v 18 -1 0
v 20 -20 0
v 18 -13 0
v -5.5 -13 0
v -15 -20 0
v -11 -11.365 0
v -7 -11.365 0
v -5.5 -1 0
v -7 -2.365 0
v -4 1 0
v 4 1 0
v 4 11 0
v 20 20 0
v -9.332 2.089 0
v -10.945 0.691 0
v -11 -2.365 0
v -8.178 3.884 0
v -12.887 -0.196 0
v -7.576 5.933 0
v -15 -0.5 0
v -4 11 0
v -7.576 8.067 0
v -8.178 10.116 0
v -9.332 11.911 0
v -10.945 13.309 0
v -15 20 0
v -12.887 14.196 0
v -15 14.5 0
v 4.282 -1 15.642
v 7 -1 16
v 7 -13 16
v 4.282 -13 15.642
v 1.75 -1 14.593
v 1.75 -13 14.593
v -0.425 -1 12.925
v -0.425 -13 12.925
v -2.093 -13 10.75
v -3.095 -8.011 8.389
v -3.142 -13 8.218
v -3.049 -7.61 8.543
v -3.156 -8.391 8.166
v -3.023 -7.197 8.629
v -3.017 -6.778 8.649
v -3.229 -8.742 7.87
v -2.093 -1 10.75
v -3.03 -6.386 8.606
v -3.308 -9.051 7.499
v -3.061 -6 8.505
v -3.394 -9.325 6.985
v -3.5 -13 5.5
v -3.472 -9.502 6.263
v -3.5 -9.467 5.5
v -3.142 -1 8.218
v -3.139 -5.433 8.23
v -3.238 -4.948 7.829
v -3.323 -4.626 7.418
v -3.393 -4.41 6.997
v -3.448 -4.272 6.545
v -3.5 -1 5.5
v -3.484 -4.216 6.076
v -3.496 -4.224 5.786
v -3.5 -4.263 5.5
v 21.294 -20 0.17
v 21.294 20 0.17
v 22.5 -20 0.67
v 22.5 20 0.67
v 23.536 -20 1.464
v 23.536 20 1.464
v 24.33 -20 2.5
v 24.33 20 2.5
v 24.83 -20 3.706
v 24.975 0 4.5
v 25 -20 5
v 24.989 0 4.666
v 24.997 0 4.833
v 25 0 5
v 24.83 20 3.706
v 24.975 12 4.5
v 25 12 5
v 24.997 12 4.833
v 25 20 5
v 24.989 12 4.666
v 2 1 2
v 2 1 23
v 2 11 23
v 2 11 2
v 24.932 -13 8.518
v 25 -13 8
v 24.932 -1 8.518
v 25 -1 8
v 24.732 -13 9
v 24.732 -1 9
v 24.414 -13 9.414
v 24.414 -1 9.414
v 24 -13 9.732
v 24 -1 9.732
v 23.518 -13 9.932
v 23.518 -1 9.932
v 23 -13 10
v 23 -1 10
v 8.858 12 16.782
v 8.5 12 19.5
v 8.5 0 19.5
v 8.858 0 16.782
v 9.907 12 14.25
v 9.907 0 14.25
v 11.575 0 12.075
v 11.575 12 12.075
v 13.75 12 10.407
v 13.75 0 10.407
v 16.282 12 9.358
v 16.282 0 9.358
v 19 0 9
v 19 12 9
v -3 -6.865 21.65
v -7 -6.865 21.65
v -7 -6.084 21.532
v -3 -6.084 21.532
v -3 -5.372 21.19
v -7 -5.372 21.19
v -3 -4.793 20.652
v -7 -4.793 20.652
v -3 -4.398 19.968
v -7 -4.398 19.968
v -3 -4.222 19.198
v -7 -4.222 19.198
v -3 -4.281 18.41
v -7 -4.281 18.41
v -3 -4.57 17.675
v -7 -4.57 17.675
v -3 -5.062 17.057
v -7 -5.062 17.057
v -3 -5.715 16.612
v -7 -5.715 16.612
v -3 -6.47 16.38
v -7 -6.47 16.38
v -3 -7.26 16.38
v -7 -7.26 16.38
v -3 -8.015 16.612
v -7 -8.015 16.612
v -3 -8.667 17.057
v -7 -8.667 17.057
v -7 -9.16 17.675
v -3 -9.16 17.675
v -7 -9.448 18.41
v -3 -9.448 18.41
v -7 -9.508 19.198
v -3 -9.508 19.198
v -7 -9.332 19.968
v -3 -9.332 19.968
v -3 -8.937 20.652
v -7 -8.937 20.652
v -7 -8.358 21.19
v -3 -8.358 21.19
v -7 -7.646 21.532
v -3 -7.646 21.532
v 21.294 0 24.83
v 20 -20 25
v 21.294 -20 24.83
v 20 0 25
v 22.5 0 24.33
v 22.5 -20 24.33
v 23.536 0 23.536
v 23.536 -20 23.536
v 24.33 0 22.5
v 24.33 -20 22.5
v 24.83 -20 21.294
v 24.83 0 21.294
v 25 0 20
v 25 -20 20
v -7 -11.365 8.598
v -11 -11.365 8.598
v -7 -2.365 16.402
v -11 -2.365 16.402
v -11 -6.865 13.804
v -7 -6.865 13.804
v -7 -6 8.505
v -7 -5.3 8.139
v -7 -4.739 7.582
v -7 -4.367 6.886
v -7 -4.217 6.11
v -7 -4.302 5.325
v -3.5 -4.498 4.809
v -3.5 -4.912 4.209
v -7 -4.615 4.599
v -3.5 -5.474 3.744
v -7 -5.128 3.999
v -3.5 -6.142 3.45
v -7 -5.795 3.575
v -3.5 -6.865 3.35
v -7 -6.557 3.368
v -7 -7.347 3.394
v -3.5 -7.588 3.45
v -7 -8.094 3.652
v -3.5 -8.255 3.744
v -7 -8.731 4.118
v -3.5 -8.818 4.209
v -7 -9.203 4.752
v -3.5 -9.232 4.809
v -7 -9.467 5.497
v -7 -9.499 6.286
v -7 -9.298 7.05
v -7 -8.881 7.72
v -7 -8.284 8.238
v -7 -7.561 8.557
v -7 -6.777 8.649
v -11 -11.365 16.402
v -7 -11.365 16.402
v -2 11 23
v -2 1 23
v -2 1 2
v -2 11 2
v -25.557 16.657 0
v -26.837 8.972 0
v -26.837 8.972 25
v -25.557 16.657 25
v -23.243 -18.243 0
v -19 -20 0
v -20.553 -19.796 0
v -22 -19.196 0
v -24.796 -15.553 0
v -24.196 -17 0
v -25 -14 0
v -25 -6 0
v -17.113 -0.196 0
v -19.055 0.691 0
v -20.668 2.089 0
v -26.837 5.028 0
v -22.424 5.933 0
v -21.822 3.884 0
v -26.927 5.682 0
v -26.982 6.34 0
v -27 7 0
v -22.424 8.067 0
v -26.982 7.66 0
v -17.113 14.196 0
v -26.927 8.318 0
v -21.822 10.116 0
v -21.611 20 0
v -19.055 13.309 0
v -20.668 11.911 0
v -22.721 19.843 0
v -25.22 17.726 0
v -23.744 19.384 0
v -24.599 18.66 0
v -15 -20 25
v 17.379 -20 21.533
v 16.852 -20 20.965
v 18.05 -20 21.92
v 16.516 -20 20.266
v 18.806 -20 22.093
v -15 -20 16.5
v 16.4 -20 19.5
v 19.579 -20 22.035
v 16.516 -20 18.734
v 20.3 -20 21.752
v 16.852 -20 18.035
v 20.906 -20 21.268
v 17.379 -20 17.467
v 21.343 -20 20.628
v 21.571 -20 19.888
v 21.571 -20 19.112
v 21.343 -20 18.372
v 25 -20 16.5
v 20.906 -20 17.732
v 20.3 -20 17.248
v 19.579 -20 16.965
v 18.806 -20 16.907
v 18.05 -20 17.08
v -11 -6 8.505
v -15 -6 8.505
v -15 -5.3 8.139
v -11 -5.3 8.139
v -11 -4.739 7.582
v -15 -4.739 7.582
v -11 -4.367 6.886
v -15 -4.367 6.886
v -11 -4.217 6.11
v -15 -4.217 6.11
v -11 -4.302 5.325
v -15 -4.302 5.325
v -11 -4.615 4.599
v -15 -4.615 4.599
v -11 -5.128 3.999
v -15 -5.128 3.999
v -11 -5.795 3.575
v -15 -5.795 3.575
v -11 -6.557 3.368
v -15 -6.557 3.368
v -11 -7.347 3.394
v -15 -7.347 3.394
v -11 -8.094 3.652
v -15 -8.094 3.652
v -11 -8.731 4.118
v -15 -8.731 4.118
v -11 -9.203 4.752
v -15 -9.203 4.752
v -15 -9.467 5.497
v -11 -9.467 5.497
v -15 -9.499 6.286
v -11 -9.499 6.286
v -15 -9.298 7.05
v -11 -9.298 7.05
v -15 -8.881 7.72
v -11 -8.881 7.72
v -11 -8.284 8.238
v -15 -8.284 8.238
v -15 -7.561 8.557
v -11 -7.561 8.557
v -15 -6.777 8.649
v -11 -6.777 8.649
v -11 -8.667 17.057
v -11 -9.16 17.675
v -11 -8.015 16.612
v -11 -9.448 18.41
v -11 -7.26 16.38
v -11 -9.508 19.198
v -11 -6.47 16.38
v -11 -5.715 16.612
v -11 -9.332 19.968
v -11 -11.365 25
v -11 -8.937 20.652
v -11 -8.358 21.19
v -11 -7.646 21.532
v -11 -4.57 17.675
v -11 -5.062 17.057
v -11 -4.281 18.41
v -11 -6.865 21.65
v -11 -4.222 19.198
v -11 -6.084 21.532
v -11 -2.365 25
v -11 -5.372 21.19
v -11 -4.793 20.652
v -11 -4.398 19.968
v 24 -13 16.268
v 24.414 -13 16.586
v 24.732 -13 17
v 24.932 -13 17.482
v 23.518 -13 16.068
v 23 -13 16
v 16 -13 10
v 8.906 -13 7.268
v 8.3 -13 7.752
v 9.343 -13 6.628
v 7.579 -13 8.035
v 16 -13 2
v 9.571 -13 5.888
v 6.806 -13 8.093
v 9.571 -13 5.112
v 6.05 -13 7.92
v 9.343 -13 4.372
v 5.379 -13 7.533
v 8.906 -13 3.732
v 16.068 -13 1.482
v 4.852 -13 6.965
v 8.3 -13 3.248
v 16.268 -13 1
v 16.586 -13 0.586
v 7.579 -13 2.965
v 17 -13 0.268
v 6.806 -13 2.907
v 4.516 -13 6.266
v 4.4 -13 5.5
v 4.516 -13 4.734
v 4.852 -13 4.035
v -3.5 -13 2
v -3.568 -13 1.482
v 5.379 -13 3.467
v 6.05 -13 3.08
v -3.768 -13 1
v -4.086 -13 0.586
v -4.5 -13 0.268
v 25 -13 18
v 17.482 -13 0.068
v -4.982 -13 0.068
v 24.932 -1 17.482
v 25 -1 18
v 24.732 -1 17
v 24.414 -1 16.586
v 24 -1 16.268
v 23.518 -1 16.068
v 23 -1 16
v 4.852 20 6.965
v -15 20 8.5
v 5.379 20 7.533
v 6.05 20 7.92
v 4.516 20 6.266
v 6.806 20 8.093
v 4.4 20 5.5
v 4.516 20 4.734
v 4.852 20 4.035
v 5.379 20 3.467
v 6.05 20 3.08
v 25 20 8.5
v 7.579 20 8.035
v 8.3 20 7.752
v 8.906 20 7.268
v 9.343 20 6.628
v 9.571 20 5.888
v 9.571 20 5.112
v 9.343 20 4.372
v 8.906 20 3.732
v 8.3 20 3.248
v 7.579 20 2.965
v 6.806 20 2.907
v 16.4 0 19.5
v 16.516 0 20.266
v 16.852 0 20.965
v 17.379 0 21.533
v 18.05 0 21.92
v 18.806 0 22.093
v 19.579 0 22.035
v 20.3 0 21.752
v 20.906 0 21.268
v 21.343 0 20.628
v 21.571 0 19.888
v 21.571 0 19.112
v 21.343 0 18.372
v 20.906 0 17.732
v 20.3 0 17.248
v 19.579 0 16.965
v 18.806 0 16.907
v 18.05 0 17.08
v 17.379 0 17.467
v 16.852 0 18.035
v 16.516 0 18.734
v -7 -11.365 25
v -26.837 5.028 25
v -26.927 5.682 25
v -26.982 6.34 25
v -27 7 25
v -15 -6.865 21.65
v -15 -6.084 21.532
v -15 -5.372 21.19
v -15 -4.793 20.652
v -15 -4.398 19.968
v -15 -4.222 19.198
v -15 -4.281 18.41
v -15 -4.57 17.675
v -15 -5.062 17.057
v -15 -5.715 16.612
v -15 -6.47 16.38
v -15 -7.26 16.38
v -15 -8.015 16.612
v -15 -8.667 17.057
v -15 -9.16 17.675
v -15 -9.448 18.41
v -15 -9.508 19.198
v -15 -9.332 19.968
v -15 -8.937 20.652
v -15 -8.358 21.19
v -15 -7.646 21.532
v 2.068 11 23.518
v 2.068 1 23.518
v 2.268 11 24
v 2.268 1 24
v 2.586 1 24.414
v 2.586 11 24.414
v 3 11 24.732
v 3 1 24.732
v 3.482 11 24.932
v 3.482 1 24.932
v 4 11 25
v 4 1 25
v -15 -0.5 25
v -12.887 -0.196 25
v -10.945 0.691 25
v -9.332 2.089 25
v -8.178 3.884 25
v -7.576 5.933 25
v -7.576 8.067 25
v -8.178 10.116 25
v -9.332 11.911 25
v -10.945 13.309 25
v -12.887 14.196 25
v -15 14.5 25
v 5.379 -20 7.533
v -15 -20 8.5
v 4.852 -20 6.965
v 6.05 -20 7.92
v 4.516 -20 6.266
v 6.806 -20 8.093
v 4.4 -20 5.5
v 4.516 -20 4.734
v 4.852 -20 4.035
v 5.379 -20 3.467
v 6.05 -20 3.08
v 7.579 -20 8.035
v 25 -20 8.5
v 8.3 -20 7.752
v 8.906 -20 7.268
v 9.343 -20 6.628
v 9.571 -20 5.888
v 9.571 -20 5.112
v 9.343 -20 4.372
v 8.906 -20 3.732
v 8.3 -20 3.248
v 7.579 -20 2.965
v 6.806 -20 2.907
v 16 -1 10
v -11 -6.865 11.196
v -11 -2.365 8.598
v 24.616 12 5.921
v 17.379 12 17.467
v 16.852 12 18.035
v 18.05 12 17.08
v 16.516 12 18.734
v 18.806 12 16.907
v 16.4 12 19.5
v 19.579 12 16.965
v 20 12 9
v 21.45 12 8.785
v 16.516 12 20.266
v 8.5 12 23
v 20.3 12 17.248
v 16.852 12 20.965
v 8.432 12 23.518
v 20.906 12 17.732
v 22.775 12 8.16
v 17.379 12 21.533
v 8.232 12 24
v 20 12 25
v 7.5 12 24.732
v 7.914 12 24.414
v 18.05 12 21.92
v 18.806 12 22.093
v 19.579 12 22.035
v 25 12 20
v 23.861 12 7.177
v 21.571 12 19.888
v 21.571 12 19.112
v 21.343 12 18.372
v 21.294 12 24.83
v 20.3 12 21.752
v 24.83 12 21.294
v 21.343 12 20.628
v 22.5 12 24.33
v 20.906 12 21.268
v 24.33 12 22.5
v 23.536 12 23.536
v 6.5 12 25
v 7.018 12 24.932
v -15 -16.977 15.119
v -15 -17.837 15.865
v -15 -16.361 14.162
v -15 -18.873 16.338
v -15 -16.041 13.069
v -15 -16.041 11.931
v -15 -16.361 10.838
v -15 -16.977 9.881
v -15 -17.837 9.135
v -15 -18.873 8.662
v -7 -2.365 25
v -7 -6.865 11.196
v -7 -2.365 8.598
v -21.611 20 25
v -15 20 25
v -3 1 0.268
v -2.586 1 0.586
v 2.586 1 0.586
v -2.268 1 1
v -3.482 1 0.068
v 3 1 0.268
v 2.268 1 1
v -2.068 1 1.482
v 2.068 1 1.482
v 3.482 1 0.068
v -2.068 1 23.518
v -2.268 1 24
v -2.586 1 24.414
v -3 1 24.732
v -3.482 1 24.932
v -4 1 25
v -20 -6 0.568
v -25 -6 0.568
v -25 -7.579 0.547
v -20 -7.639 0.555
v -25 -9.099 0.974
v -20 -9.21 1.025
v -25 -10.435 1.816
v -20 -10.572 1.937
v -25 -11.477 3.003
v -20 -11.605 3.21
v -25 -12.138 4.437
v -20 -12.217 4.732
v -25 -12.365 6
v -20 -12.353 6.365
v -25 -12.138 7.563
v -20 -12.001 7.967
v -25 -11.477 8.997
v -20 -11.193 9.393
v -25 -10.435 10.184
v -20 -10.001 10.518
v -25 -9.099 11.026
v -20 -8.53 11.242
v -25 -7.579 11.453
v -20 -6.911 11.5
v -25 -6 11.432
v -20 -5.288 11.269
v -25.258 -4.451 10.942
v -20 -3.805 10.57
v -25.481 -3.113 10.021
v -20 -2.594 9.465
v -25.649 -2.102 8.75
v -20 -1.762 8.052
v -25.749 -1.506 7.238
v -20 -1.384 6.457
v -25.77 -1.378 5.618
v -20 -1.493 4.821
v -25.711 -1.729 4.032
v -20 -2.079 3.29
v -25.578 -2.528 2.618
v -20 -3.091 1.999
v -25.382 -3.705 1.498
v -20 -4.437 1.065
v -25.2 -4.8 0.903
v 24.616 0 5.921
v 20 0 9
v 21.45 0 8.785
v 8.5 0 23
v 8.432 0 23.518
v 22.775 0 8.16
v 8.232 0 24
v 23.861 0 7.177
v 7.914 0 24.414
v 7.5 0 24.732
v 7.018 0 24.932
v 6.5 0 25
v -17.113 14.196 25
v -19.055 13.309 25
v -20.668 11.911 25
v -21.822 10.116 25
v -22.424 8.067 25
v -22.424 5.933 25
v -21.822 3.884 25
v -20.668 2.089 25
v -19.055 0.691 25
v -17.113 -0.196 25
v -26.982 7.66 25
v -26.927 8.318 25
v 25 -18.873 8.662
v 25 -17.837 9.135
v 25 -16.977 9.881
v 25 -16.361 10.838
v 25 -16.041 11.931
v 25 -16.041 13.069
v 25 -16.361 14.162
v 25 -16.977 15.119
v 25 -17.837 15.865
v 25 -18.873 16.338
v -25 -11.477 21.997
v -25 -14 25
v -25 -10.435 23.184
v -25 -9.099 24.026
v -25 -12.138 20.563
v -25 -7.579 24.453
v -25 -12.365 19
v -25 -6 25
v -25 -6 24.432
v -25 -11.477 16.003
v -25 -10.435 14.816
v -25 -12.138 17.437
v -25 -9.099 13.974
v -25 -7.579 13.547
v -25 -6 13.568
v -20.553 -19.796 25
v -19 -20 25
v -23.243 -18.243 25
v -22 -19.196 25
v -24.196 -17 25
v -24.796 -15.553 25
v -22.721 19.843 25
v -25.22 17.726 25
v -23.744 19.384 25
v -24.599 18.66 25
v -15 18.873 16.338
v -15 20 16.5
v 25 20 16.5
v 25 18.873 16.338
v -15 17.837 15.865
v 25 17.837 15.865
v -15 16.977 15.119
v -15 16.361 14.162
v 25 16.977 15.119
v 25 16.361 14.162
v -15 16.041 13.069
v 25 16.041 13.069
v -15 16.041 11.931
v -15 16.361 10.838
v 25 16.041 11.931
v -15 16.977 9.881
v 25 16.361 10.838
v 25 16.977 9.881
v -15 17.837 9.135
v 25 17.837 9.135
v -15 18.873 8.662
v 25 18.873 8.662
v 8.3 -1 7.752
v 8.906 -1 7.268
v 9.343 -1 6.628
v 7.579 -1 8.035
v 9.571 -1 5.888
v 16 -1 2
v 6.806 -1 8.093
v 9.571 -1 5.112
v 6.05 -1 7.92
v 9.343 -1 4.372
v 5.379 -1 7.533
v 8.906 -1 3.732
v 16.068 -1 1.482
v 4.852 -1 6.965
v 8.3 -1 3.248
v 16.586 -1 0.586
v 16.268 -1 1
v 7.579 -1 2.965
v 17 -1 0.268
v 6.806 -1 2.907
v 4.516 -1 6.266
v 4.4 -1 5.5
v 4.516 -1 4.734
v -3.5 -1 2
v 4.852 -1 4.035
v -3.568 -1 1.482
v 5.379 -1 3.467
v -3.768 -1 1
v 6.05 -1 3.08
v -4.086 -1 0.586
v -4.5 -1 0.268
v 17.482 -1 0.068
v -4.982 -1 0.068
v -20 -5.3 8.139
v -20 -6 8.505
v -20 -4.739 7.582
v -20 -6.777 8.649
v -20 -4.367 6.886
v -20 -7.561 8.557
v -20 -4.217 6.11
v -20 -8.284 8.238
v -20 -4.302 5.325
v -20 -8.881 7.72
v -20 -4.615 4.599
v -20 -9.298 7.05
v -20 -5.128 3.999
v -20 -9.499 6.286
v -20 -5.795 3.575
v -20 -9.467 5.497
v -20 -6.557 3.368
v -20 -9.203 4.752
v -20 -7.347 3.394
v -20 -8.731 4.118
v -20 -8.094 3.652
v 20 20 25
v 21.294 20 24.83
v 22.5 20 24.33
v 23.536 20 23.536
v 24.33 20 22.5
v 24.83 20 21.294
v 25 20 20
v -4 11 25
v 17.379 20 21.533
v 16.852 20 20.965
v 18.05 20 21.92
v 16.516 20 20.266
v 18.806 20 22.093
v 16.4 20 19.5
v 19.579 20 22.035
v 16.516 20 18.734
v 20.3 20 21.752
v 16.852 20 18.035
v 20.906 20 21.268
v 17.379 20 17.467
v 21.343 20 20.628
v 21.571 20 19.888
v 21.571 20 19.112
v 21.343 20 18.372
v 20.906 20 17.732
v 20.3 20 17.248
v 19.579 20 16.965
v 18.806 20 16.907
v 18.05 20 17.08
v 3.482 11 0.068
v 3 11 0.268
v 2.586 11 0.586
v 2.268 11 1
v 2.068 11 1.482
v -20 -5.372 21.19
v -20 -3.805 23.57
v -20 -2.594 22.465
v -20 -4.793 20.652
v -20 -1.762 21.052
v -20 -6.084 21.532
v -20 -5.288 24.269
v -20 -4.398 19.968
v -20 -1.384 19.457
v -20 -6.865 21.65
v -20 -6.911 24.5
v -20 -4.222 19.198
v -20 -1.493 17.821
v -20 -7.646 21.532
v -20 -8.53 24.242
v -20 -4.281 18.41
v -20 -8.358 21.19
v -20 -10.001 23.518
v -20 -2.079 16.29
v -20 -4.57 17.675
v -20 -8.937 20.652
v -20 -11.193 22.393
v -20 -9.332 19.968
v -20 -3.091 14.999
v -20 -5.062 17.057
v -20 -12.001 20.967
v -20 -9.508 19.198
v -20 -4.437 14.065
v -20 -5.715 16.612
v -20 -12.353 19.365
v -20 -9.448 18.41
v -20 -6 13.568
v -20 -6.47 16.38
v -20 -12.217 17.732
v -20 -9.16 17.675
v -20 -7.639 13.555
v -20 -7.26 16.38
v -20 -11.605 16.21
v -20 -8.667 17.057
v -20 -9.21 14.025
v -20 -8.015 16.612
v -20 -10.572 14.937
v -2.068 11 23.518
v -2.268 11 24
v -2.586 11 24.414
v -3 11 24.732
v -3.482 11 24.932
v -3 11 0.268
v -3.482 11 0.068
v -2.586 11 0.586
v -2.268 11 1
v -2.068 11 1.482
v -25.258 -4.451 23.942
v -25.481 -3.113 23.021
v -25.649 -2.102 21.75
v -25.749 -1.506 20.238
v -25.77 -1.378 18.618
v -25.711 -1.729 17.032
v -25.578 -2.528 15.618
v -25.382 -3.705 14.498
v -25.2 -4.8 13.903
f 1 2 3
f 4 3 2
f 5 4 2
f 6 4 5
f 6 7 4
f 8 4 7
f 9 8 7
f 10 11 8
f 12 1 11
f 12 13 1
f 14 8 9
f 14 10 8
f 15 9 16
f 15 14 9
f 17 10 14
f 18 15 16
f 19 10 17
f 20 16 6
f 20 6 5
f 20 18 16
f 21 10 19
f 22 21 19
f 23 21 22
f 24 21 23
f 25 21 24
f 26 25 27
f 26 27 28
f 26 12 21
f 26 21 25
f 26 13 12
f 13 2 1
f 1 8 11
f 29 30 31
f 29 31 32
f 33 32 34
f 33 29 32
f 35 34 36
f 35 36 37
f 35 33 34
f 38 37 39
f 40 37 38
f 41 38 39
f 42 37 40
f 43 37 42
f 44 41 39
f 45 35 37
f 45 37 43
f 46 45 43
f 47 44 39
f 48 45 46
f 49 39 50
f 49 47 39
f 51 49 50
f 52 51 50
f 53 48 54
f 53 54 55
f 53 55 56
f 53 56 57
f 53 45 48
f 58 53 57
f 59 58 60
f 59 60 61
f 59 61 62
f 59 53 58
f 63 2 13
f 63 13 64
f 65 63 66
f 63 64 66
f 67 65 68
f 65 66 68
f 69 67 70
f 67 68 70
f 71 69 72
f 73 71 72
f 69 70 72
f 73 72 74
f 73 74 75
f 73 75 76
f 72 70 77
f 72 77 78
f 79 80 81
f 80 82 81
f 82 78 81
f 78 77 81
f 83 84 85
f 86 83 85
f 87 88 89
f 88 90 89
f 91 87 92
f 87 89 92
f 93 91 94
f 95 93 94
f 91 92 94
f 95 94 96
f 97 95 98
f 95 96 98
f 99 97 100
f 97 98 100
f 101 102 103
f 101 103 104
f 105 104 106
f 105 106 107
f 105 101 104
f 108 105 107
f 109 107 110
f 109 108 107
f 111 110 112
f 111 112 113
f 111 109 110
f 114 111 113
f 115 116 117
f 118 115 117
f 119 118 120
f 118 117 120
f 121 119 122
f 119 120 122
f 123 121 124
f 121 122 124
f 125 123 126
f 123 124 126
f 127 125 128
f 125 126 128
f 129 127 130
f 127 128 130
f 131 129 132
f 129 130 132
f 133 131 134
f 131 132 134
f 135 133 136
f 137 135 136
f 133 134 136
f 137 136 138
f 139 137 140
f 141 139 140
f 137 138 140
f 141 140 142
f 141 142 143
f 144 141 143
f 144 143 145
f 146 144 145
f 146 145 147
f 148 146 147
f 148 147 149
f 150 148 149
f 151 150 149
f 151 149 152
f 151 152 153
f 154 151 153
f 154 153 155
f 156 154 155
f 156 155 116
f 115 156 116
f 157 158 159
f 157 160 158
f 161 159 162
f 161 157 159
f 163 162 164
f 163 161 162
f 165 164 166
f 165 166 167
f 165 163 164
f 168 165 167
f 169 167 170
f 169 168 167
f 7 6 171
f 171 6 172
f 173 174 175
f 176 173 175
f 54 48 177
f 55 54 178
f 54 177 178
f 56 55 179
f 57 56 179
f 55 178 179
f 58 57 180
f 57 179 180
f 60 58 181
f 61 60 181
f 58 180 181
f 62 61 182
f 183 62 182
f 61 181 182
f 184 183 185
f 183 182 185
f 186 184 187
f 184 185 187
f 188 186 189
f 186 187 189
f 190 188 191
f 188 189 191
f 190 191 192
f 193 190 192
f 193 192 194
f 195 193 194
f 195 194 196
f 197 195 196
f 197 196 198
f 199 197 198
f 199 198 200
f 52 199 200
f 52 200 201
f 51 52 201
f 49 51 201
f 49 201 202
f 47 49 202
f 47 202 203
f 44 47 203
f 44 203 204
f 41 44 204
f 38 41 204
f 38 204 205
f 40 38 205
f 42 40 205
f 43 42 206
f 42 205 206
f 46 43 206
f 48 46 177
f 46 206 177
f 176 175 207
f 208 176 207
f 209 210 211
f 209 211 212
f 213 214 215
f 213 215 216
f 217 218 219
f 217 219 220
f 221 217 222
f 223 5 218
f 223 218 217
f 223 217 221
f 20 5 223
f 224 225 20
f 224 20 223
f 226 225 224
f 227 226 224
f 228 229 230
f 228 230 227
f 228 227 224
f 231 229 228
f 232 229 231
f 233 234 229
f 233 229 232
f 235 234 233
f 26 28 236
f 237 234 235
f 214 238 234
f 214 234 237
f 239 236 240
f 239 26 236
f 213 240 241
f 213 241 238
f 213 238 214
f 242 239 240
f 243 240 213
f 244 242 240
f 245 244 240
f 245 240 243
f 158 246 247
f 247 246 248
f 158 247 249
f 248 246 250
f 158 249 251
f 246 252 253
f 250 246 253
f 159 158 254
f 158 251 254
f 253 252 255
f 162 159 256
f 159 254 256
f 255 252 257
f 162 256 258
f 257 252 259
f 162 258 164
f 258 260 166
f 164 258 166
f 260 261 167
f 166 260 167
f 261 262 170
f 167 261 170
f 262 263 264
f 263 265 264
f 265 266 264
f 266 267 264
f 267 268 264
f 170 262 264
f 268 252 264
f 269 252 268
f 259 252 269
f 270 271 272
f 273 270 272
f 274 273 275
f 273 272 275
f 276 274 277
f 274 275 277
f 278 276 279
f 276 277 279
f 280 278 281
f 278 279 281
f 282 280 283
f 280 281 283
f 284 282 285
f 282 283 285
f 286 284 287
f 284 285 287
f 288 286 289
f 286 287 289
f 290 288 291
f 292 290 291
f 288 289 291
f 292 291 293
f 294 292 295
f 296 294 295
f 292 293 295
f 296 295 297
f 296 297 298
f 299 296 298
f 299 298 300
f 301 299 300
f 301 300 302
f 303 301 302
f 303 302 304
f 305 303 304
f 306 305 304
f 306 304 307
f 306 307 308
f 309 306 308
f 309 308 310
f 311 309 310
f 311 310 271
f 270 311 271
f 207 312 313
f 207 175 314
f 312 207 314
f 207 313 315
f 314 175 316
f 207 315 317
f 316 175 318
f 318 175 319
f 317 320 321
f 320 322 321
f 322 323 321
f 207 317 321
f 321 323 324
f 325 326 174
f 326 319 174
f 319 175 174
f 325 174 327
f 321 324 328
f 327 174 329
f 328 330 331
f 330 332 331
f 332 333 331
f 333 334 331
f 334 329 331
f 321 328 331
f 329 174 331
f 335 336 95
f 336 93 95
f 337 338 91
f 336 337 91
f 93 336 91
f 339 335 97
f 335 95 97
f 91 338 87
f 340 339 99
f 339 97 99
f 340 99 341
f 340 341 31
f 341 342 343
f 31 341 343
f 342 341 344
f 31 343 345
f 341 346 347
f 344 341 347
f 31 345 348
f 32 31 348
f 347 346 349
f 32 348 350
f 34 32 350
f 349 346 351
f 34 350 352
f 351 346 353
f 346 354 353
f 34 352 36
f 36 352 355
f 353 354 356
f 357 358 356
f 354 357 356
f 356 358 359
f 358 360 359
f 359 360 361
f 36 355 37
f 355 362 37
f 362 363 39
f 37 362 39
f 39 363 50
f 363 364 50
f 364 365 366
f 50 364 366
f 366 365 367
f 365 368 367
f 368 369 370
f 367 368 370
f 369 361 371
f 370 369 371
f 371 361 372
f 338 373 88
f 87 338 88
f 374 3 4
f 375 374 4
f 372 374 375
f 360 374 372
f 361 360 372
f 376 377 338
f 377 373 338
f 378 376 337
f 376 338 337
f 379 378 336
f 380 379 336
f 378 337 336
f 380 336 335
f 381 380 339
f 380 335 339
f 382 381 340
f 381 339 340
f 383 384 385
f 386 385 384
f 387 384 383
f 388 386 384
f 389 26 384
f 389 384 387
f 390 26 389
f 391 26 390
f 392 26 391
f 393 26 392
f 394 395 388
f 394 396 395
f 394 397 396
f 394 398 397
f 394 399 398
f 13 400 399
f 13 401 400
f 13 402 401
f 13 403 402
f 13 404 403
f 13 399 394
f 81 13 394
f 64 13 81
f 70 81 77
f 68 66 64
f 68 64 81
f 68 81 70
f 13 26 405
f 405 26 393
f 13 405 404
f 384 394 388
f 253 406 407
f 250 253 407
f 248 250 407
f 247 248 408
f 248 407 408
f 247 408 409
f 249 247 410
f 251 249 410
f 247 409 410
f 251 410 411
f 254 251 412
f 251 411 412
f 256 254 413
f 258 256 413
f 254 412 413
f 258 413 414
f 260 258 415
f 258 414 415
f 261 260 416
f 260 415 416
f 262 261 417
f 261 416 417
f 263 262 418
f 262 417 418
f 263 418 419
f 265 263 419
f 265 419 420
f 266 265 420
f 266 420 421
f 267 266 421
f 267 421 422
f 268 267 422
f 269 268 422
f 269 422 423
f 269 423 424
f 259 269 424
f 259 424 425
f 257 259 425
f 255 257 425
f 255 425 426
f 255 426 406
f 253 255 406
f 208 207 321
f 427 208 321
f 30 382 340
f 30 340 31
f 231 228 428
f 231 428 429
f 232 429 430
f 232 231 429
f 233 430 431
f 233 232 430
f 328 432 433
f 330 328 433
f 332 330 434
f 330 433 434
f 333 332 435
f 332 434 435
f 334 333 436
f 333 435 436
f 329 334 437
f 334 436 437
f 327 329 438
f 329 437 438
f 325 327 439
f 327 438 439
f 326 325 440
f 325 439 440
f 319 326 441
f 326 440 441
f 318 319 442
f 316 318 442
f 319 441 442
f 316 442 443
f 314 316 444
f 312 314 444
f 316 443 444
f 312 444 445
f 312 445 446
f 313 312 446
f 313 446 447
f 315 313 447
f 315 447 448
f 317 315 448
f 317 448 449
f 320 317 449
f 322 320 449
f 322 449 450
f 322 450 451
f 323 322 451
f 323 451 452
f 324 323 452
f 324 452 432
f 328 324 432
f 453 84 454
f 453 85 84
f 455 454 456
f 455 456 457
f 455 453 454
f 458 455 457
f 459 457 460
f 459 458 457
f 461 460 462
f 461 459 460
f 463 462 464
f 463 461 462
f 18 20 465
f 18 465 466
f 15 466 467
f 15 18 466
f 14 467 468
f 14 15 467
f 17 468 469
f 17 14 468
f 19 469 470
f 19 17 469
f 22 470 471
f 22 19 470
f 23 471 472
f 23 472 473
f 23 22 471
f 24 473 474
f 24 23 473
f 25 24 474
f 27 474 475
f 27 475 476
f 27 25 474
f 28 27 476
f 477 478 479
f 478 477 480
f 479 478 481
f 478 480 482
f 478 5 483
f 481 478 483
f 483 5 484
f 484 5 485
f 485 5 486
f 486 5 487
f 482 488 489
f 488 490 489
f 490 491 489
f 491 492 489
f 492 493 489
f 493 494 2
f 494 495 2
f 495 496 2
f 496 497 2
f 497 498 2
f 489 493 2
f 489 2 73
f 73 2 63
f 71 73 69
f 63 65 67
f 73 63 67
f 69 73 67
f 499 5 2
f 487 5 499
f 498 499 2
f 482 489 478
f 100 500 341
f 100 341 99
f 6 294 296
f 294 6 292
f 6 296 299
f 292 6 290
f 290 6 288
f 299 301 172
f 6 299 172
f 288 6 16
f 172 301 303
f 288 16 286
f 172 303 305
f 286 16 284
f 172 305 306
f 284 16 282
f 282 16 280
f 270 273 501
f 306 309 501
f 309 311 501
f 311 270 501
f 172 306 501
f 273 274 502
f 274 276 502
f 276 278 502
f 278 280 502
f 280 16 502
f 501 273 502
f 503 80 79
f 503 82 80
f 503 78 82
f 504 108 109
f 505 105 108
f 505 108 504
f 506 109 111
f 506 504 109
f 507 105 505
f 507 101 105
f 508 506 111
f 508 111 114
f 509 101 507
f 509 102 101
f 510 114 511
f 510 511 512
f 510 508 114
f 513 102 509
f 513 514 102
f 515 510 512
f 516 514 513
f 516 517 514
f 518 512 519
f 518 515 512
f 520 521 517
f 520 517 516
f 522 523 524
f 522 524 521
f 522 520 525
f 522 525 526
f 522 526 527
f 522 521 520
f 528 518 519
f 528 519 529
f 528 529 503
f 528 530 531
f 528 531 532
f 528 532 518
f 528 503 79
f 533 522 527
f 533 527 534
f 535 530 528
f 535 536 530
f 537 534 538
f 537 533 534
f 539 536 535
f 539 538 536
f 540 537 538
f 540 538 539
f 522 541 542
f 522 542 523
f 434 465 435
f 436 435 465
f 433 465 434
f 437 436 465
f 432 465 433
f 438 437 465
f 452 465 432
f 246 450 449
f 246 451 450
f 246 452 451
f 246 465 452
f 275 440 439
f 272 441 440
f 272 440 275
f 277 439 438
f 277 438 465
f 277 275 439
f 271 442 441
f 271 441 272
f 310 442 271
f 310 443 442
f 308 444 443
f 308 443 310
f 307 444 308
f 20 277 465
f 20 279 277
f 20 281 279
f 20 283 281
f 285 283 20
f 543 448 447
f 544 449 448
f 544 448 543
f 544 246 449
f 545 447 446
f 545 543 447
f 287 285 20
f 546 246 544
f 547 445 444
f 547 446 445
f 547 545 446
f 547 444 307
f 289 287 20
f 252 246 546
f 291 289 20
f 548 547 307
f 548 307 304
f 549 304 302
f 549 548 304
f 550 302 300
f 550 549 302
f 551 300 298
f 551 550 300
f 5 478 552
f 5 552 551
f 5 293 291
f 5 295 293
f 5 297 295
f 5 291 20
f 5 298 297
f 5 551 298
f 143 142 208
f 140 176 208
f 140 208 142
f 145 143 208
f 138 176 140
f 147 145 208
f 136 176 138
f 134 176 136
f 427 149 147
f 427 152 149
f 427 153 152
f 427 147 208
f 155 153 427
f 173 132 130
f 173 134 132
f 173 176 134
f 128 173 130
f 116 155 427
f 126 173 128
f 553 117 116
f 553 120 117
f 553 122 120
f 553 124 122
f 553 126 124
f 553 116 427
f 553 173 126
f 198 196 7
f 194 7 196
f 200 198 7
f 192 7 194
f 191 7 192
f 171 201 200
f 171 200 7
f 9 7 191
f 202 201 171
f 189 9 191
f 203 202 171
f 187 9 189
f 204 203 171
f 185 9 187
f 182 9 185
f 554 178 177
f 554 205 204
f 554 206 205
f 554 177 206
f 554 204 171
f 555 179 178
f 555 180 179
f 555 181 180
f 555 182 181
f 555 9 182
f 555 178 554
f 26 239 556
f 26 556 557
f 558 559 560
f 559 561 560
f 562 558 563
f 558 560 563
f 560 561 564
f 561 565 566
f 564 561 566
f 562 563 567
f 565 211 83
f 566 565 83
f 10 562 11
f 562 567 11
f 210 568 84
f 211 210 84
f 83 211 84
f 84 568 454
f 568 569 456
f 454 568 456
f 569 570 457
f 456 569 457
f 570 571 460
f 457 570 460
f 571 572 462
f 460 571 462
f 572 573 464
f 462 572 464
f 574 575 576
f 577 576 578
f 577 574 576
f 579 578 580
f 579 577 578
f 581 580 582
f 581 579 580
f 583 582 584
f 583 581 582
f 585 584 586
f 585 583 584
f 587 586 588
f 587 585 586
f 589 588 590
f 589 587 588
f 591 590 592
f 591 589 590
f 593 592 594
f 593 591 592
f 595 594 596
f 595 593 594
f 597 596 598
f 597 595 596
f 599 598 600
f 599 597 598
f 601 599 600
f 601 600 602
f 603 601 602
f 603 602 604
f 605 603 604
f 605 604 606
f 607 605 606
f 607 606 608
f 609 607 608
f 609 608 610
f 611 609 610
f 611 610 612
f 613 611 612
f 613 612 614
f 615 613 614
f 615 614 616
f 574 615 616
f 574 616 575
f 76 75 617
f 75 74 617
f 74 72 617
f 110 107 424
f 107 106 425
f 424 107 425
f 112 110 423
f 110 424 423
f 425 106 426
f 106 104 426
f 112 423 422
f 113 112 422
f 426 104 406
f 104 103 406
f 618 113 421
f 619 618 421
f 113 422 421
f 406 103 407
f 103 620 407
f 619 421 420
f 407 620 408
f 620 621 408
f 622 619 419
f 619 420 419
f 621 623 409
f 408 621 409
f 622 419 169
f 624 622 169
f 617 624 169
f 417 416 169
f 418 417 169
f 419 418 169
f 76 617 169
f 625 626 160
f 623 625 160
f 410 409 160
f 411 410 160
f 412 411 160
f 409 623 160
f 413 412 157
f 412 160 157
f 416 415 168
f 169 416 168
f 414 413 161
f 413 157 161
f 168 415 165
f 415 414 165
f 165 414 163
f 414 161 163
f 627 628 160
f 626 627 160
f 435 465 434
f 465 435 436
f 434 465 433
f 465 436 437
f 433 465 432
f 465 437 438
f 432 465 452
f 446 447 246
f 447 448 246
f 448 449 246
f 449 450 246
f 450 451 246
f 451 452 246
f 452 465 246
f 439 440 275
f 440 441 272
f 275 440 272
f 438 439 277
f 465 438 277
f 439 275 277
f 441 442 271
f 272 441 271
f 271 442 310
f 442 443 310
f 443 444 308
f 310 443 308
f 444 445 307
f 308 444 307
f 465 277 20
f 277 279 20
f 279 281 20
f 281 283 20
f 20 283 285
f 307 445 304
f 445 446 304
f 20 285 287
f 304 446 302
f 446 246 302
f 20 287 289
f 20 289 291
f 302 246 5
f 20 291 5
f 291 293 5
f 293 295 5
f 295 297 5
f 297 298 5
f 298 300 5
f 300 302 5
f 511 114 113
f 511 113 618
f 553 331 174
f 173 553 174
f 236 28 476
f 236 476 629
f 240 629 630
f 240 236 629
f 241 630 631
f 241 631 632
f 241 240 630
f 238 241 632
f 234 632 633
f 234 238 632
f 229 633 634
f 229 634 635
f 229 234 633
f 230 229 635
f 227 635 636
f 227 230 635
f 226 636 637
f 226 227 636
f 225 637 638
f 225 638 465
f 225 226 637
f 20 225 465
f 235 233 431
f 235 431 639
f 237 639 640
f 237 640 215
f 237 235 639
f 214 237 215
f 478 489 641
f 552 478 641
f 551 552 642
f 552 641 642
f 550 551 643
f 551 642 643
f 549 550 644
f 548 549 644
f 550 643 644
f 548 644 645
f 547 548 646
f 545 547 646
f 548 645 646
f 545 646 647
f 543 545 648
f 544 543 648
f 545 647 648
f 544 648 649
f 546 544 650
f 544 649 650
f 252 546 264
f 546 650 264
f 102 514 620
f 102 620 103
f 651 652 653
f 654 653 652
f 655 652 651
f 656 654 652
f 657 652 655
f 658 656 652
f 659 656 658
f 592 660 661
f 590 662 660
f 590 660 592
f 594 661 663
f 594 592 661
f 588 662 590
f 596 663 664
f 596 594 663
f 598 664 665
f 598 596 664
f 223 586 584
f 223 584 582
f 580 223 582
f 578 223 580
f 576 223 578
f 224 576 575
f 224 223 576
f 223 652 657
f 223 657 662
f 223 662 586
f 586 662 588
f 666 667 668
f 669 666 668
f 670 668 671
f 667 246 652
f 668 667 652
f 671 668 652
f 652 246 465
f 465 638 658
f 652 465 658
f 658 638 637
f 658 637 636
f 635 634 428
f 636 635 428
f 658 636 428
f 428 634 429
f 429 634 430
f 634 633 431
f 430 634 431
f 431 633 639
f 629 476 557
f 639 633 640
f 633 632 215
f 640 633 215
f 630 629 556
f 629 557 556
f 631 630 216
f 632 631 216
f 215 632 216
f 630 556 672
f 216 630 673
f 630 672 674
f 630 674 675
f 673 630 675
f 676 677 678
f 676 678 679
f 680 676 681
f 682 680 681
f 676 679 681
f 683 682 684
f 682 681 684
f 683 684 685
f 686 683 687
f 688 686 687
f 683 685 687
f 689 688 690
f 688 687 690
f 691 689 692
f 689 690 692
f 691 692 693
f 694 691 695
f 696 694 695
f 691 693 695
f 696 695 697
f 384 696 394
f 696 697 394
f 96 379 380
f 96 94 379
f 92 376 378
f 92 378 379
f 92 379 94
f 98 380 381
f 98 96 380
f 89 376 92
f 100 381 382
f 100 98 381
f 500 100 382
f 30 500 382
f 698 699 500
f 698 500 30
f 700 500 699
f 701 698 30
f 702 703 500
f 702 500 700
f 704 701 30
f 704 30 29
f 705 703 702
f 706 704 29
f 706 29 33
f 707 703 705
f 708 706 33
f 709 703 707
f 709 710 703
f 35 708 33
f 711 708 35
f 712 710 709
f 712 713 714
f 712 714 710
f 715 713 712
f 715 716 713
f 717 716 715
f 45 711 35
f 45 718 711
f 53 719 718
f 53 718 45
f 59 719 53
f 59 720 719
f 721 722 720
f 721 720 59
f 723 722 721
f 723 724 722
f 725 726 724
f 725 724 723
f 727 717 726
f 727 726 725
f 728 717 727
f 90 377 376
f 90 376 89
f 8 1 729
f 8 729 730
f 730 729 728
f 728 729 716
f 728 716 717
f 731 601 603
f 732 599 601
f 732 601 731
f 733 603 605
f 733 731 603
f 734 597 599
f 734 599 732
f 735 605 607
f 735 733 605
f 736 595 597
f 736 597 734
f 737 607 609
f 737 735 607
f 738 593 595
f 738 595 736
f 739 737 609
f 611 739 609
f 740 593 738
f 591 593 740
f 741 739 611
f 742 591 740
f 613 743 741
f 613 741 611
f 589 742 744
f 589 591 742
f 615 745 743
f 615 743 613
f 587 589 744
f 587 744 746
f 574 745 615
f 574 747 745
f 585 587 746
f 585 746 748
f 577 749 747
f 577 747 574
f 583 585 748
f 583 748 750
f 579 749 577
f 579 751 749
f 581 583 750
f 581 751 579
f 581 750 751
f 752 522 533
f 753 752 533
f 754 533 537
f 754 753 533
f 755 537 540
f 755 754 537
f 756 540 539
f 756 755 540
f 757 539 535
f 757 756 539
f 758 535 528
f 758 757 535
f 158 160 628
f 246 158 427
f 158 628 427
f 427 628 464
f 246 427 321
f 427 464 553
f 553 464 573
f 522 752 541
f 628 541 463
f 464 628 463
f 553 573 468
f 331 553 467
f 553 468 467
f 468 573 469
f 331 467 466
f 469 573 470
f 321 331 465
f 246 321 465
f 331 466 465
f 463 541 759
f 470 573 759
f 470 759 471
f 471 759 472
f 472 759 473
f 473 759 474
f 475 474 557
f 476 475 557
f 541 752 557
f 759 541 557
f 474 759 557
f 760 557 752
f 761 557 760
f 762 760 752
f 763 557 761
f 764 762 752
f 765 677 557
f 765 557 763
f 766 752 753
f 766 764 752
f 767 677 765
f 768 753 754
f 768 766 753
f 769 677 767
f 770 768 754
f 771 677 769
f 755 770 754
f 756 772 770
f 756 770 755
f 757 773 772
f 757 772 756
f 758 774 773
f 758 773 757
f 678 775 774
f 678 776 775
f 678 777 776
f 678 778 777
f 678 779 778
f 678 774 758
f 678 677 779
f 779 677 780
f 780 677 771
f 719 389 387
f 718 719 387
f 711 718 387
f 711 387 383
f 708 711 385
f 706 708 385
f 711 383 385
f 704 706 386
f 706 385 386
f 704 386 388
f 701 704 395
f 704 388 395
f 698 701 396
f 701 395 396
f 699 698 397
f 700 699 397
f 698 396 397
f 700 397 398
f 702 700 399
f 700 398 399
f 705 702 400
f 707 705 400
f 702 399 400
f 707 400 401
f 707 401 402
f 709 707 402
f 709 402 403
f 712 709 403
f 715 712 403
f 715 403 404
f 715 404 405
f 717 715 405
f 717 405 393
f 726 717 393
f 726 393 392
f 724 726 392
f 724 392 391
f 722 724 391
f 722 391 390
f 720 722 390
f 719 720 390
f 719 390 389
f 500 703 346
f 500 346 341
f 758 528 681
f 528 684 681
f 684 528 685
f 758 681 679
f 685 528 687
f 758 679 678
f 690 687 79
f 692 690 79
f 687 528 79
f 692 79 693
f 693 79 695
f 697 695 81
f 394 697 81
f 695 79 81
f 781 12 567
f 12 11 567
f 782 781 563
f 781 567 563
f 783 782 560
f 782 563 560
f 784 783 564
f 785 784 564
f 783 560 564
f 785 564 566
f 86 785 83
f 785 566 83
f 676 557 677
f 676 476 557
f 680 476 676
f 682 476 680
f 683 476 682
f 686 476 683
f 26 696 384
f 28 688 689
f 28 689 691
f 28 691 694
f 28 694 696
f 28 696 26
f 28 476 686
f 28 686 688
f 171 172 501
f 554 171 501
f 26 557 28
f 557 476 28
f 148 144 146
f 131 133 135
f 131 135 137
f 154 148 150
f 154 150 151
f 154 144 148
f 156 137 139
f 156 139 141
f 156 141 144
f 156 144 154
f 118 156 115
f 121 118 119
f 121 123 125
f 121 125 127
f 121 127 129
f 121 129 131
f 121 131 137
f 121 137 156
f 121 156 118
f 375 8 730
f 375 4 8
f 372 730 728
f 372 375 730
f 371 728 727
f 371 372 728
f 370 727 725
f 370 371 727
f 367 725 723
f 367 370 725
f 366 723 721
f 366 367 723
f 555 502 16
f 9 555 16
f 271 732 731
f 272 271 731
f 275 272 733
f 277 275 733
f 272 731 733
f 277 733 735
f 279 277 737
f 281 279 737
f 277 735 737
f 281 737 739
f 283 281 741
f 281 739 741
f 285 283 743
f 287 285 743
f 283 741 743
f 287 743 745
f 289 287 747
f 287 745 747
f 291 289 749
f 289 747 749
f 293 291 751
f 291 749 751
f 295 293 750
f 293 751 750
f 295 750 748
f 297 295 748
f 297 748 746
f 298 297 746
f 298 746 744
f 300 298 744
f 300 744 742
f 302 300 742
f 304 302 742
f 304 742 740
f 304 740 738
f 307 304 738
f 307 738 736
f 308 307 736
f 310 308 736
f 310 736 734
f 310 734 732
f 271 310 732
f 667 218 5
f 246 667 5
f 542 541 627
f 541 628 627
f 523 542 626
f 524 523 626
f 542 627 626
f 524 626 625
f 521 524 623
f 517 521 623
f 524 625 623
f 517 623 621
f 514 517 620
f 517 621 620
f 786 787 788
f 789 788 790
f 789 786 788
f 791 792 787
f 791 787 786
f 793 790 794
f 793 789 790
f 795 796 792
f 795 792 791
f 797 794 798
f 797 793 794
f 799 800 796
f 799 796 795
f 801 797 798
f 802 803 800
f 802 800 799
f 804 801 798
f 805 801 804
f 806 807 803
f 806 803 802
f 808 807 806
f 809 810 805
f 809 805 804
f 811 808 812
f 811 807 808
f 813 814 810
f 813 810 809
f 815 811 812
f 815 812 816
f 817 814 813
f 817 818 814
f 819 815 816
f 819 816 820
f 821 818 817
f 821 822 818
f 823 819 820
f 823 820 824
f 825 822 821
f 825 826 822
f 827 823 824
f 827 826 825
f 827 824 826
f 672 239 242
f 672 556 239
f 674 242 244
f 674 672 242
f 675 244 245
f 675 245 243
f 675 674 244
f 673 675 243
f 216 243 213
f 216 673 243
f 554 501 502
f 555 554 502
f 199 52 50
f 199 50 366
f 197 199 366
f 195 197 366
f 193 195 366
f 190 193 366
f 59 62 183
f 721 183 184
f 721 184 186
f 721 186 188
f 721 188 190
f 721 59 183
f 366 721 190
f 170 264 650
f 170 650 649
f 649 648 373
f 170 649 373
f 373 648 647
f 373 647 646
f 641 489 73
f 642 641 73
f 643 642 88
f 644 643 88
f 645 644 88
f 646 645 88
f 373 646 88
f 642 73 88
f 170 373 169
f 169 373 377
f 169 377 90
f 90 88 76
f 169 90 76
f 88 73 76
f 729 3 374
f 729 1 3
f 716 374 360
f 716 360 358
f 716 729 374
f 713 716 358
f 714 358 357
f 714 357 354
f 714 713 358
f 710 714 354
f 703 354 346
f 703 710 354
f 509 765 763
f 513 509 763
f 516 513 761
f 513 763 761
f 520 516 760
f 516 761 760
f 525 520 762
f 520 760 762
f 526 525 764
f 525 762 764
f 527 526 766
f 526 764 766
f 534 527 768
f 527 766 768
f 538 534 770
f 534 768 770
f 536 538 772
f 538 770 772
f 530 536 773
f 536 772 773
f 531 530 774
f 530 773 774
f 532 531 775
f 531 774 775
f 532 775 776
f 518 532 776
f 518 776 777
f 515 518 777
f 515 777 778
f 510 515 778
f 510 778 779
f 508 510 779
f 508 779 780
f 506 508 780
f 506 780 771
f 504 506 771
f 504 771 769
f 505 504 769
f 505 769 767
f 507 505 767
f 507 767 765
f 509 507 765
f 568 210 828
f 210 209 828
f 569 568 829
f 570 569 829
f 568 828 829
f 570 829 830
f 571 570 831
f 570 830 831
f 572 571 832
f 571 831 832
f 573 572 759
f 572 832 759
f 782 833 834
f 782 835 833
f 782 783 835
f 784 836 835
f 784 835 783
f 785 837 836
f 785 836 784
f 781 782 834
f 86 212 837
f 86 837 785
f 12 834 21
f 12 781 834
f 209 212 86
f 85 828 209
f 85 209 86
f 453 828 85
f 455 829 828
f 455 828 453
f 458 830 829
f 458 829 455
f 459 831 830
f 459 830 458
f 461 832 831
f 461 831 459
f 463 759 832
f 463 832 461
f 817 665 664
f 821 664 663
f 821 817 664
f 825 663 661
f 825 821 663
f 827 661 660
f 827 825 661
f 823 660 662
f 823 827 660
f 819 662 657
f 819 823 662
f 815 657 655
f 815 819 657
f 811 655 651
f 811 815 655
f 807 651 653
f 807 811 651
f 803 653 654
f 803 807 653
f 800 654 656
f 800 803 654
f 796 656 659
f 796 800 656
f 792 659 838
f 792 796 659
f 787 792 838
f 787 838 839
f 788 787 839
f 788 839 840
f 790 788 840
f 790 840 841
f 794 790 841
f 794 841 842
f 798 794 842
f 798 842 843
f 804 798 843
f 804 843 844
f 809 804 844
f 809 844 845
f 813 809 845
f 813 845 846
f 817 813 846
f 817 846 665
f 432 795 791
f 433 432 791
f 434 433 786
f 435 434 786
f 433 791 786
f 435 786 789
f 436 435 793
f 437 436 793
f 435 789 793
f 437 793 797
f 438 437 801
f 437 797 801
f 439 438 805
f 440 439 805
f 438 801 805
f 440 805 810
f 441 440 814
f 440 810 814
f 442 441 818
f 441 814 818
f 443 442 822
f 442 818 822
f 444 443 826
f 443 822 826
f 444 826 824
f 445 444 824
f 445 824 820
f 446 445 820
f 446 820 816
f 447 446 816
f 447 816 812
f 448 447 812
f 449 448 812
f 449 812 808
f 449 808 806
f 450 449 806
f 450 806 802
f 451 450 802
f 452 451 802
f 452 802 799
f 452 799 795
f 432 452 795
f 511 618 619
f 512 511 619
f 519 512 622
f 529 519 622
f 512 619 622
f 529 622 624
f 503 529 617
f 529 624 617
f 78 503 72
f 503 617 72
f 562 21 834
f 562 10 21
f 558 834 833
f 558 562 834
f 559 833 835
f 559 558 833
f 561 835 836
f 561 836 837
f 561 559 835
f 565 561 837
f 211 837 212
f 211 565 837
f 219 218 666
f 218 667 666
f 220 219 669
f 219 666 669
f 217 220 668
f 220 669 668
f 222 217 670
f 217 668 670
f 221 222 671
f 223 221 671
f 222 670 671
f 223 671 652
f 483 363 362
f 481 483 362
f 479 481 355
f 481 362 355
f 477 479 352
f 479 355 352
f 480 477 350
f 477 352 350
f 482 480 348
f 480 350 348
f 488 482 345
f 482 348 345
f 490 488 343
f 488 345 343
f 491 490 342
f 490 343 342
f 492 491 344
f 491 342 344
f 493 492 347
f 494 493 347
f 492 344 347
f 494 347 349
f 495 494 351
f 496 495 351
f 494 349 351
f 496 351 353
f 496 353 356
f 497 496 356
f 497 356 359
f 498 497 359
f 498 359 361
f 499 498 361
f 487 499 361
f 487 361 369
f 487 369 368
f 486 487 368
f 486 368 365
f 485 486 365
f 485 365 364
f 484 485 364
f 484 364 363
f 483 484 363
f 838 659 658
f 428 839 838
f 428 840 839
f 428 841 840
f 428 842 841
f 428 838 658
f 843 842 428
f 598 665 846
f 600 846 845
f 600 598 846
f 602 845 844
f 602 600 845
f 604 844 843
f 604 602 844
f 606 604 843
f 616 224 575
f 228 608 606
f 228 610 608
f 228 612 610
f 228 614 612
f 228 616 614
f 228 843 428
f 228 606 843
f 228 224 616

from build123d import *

# Parameters (mm, degrees)
SKETCH1_W               = 50
SKETCH1_H               = 40
SKETCH1_R               = 7.5
BOSS_EXTRUDE1_DEPTH     = 25
SKETCH2_R               = 4
CUT_EXTRUDE1_DEPTH      = 40
SKETCH4_R               = 2.6
CUT_EXTRUDE2_DEPTH      = 54.38539126
BOSS_EXTRUDE2_DEPTH     = 25
SKETCH6_W               = 4
SKETCH6_H               = 10
CUT_EXTRUDE3_DEPTH      = 42.880783183
CUT_EXTRUDE4_START      = -8
CUT_EXTRUDE4_DEPTH      = 12
CUT_EXTRUDE5_START      = -21
CUT_EXTRUDE5_DEPTH      = 12
SKETCH12_R              = 2.65
CUT_EXTRUDE6_DEPTH      = 22
CUT_EXTRUDE7_START      = -14
CUT_EXTRUDE7_DEPTH      = 4
CUT_EXTRUDE8_DEPTH      = 10
CUT_EXTRUDE8_DEPTH_BACK = 5
SKETCH14_R              = 5.5
FILLET1_R               = 5
FILLET2_R               = 2
FILLET3_R               = 4
FILLET4_R               = 5
FILLET5_R               = 6


with BuildPart() as part:
    # Sketch1 → Boss-Extrude1 (new body)
    with BuildSketch(Plane.XY):
        Rectangle(SKETCH1_W, SKETCH1_H)
        with Locations((-15, 7)):
            Circle(SKETCH1_R, mode=Mode.SUBTRACT)
    extrude(amount=BOSS_EXTRUDE1_DEPTH)

    # Sketch2 → Cut-Extrude1 (cut)
    with BuildSketch(Plane(origin=(25, 0, 0), x_dir=(0, 0, -1), z_dir=(1, 0, 0))):
        with Locations((-12.5, 20)):
            Circle(SKETCH2_R)
        with Locations((-12.5, -20)):
            Circle(SKETCH2_R)
    extrude(amount=-CUT_EXTRUDE1_DEPTH, mode=Mode.SUBTRACT)

    # Sketch4 → Cut-Extrude2 (cut, through all)
    with BuildSketch(Plane(origin=(0, 20, 0), x_dir=(1, 0, 0), z_dir=(0, 1, 0))):
        with Locations(Location((7, -5.5, 0), (0, 0, 180))):
            Circle(SKETCH4_R)
        with Locations(Location((19, -19.5, 0), (0, 0, 180))):
            Circle(SKETCH4_R)
    extrude(amount=-CUT_EXTRUDE2_DEPTH, mode=Mode.SUBTRACT)

    # Sketch17 → Boss-Extrude2 (add)
    with BuildSketch(Plane(origin=(0, 0, 0), x_dir=(-1, 0, 0), z_dir=(0, 0, -1))):
        with BuildLine():
            ThreePointArc((26.836925734, 5.028404411), (26.164478755, 2.600634803), (25, 0.366750419))
            Line((25, 0.366750419), (25, -6))
            Line((25, -6), (26.836925734, 5.028404411))
        make_face()
        with BuildLine():
            ThreePointArc((27, 7), (26.959161944, 7.989164089), (26.836925734, 8.971595589))
            ThreePointArc((26.836925734, 8.971595589), (26.164478755, 11.399365197), (25, 13.633249581))
            Line((25, 13.633249581), (25, 0.366750419))
            ThreePointArc((25, 0.366750419), (26.164478755, 2.600634803), (26.836925734, 5.028404411))
            ThreePointArc((26.836925734, 5.028404411), (26.959161944, 6.010835911), (27, 7))
        make_face()
        with BuildLine():
            Line((26.836925734, 8.971595589), (25, 20))
            Line((25, 20), (25, 13.633249581))
            ThreePointArc((25, 13.633249581), (26.164478755, 11.399365197), (26.836925734, 8.971595589))
        make_face()
    extrude(amount=-BOSS_EXTRUDE2_DEPTH)

    # Sketch6 → Cut-Extrude3 (cut, through all)
    with BuildSketch(Plane.XY.offset(25)):
        with Locations((0, 6)):
            Rectangle(SKETCH6_W, SKETCH6_H)
    extrude(amount=-CUT_EXTRUDE3_DEPTH, mode=Mode.SUBTRACT)

    # Sketch8 → Cut-Extrude4 (cut)
    with BuildSketch(Plane(origin=(0, 20, 0), x_dir=(1, 0, 0), z_dir=(0, 1, 0)).offset(CUT_EXTRUDE4_START)):
        with BuildLine():
            Line((19, -9), (29.5, -9))
            Line((29.5, -9), (29.5, -30))
            Line((29.5, -30), (19, -30))
            Line((19, -30), (8.5, -30))
            Line((8.5, -30), (8.5, -19.5))
            ThreePointArc((8.5, -19.5), (11.575378798, -12.075378798), (19, -9))
        make_face()
    extrude(amount=-CUT_EXTRUDE4_DEPTH, mode=Mode.SUBTRACT)

    # Sketch11 → Cut-Extrude5 (cut)
    with BuildSketch(Plane(origin=(0, 20, 0), x_dir=(1, 0, 0), z_dir=(0, 1, 0)).offset(CUT_EXTRUDE5_START)):
        with BuildLine():
            Line((16, -5), (16, -10))
            Line((16, -10), (26.226618187, -10))
            Line((26.226618187, -10), (26.226618187, -16))
            Line((26.226618187, -16), (7, -16))
            ThreePointArc((7, -16), (-0.424621202, -12.924621202), (-3.5, -5.5))
            Line((-3.5, -5.5), (-3.5, 3.5))
            Line((-3.5, 3.5), (16, 3.5))
            Line((16, 3.5), (16, -5))
        make_face()
    extrude(amount=-CUT_EXTRUDE5_DEPTH, mode=Mode.SUBTRACT)

    # Sketch12 → Cut-Extrude6 (cut)
    with BuildSketch(Plane.ZY.offset(25)):
        with Locations((19, -6.86493963)):
            Circle(SKETCH12_R)
        with Locations(Location((6, -6.86493963, 0), (0, 0, 19.049949226))):
            Circle(SKETCH12_R)
    extrude(amount=-CUT_EXTRUDE6_DEPTH, mode=Mode.SUBTRACT)

    # Sketch13 → Cut-Extrude7 (cut)
    with BuildSketch(Plane.ZY.offset(25).offset(CUT_EXTRUDE7_START)):
        Polygon((4.529172568, -11.36493963), (8.598076211, -11.36493963), (11.196152423, -6.86493963), (8.598076211, -2.36493963), (3.819451615, -2.36493963), (-1.875046018, -2.36493963), (-1.875046018, -11.36493963), align=None)
        Polygon((21.598076211, -2.36493963), (16.401923789, -2.36493963), (13.803847577, -6.86493963), (16.401923789, -11.36493963), (21.845916949, -11.36493963), (28.602568589, -11.36493963), (28.602568589, -2.36493963), align=None)
    extrude(amount=-CUT_EXTRUDE7_DEPTH, mode=Mode.SUBTRACT)

    # Sketch14 → Cut-Extrude8 (cut, two sides: drawn at the far end of the back side and taken through both)
    with BuildSketch(Plane.ZY.offset(25).offset(-CUT_EXTRUDE8_DEPTH_BACK)):
        with Locations(Location((6, -6.86493963, 0), (0, 0, 170.952005971))):
            Circle(SKETCH14_R)
        with Locations(Location((19, -6.86493963, 0), (0, 0, 170.952005971))):
            Circle(SKETCH14_R)
    extrude(amount=CUT_EXTRUDE8_DEPTH + CUT_EXTRUDE8_DEPTH_BACK, mode=Mode.SUBTRACT)


with BuildPart() as body_2:
    # Split1: the piece on the far side of the plane
    add(part.part)
    split(bisect_by=Plane(origin=(-15, 0, 0), x_dir=(0, 0, -1), z_dir=(-1, 0, 0)), keep=Keep.BOTTOM)

    # Fillet1
    fillet1_edges = [body_2.edges().sort_by_distance(p)[0] for p in [
        (25, 0, 0),
        (25, 16, 25),
        (25, -10, 25),
    ]]
    fillet(fillet1_edges, radius=FILLET1_R)

    # Fillet2
    fillet2_edges = [body_2.edges().sort_by_distance(p)[0] for p in [
        (2, 6, 25),
        (-2, 6, 25),
        (2, 6, 0),
        (-2, 6, 0),
        (8.5, 6, 25),
        (16, -7, 0),
        (-3.5, -7, 0),
        (25, -7, 16),
        (25, -7, 10),
    ]]
    fillet(fillet2_edges, radius=FILLET2_R)

    # Fillet4
    # the kernel refuses this fillet: 5 mm, written as the material it takes off along each edge
    with BuildSketch(Plane(origin=(25, 0, 9), x_dir=(-1, 0, 0), z_dir=(0, 1, 0))) as fillet4_piece_1:
        with BuildLine():
            CenterArc((FILLET4_R, -FILLET4_R), FILLET4_R, 90, 90)
            Line((0, -FILLET4_R), (0, 0))
            Line((0, 0), (FILLET4_R, 0))
        make_face()
    extrude(amount=12, mode=Mode.SUBTRACT)


with BuildPart() as part_1:
    add(part.part)

    # Split1
    split(bisect_by=Plane(origin=(-15, 0, 0), x_dir=(0, 0, -1), z_dir=(-1, 0, 0)), keep=Keep.TOP)

    # Fillet3
    fillet3_edges = [part_1.edges().sort_by_distance(p)[0] for p in [
        (-25, 20, 12.5),
    ]]
    fillet(fillet3_edges, radius=FILLET3_R)

    # Fillet5
    fillet5_edges = [part_1.edges().sort_by_distance(p)[0] for p in [
        (-25, -20, 12.5),
    ]]
    fillet(fillet5_edges, radius=FILLET5_R)


solid = Compound([body_2.part, part_1.part])
